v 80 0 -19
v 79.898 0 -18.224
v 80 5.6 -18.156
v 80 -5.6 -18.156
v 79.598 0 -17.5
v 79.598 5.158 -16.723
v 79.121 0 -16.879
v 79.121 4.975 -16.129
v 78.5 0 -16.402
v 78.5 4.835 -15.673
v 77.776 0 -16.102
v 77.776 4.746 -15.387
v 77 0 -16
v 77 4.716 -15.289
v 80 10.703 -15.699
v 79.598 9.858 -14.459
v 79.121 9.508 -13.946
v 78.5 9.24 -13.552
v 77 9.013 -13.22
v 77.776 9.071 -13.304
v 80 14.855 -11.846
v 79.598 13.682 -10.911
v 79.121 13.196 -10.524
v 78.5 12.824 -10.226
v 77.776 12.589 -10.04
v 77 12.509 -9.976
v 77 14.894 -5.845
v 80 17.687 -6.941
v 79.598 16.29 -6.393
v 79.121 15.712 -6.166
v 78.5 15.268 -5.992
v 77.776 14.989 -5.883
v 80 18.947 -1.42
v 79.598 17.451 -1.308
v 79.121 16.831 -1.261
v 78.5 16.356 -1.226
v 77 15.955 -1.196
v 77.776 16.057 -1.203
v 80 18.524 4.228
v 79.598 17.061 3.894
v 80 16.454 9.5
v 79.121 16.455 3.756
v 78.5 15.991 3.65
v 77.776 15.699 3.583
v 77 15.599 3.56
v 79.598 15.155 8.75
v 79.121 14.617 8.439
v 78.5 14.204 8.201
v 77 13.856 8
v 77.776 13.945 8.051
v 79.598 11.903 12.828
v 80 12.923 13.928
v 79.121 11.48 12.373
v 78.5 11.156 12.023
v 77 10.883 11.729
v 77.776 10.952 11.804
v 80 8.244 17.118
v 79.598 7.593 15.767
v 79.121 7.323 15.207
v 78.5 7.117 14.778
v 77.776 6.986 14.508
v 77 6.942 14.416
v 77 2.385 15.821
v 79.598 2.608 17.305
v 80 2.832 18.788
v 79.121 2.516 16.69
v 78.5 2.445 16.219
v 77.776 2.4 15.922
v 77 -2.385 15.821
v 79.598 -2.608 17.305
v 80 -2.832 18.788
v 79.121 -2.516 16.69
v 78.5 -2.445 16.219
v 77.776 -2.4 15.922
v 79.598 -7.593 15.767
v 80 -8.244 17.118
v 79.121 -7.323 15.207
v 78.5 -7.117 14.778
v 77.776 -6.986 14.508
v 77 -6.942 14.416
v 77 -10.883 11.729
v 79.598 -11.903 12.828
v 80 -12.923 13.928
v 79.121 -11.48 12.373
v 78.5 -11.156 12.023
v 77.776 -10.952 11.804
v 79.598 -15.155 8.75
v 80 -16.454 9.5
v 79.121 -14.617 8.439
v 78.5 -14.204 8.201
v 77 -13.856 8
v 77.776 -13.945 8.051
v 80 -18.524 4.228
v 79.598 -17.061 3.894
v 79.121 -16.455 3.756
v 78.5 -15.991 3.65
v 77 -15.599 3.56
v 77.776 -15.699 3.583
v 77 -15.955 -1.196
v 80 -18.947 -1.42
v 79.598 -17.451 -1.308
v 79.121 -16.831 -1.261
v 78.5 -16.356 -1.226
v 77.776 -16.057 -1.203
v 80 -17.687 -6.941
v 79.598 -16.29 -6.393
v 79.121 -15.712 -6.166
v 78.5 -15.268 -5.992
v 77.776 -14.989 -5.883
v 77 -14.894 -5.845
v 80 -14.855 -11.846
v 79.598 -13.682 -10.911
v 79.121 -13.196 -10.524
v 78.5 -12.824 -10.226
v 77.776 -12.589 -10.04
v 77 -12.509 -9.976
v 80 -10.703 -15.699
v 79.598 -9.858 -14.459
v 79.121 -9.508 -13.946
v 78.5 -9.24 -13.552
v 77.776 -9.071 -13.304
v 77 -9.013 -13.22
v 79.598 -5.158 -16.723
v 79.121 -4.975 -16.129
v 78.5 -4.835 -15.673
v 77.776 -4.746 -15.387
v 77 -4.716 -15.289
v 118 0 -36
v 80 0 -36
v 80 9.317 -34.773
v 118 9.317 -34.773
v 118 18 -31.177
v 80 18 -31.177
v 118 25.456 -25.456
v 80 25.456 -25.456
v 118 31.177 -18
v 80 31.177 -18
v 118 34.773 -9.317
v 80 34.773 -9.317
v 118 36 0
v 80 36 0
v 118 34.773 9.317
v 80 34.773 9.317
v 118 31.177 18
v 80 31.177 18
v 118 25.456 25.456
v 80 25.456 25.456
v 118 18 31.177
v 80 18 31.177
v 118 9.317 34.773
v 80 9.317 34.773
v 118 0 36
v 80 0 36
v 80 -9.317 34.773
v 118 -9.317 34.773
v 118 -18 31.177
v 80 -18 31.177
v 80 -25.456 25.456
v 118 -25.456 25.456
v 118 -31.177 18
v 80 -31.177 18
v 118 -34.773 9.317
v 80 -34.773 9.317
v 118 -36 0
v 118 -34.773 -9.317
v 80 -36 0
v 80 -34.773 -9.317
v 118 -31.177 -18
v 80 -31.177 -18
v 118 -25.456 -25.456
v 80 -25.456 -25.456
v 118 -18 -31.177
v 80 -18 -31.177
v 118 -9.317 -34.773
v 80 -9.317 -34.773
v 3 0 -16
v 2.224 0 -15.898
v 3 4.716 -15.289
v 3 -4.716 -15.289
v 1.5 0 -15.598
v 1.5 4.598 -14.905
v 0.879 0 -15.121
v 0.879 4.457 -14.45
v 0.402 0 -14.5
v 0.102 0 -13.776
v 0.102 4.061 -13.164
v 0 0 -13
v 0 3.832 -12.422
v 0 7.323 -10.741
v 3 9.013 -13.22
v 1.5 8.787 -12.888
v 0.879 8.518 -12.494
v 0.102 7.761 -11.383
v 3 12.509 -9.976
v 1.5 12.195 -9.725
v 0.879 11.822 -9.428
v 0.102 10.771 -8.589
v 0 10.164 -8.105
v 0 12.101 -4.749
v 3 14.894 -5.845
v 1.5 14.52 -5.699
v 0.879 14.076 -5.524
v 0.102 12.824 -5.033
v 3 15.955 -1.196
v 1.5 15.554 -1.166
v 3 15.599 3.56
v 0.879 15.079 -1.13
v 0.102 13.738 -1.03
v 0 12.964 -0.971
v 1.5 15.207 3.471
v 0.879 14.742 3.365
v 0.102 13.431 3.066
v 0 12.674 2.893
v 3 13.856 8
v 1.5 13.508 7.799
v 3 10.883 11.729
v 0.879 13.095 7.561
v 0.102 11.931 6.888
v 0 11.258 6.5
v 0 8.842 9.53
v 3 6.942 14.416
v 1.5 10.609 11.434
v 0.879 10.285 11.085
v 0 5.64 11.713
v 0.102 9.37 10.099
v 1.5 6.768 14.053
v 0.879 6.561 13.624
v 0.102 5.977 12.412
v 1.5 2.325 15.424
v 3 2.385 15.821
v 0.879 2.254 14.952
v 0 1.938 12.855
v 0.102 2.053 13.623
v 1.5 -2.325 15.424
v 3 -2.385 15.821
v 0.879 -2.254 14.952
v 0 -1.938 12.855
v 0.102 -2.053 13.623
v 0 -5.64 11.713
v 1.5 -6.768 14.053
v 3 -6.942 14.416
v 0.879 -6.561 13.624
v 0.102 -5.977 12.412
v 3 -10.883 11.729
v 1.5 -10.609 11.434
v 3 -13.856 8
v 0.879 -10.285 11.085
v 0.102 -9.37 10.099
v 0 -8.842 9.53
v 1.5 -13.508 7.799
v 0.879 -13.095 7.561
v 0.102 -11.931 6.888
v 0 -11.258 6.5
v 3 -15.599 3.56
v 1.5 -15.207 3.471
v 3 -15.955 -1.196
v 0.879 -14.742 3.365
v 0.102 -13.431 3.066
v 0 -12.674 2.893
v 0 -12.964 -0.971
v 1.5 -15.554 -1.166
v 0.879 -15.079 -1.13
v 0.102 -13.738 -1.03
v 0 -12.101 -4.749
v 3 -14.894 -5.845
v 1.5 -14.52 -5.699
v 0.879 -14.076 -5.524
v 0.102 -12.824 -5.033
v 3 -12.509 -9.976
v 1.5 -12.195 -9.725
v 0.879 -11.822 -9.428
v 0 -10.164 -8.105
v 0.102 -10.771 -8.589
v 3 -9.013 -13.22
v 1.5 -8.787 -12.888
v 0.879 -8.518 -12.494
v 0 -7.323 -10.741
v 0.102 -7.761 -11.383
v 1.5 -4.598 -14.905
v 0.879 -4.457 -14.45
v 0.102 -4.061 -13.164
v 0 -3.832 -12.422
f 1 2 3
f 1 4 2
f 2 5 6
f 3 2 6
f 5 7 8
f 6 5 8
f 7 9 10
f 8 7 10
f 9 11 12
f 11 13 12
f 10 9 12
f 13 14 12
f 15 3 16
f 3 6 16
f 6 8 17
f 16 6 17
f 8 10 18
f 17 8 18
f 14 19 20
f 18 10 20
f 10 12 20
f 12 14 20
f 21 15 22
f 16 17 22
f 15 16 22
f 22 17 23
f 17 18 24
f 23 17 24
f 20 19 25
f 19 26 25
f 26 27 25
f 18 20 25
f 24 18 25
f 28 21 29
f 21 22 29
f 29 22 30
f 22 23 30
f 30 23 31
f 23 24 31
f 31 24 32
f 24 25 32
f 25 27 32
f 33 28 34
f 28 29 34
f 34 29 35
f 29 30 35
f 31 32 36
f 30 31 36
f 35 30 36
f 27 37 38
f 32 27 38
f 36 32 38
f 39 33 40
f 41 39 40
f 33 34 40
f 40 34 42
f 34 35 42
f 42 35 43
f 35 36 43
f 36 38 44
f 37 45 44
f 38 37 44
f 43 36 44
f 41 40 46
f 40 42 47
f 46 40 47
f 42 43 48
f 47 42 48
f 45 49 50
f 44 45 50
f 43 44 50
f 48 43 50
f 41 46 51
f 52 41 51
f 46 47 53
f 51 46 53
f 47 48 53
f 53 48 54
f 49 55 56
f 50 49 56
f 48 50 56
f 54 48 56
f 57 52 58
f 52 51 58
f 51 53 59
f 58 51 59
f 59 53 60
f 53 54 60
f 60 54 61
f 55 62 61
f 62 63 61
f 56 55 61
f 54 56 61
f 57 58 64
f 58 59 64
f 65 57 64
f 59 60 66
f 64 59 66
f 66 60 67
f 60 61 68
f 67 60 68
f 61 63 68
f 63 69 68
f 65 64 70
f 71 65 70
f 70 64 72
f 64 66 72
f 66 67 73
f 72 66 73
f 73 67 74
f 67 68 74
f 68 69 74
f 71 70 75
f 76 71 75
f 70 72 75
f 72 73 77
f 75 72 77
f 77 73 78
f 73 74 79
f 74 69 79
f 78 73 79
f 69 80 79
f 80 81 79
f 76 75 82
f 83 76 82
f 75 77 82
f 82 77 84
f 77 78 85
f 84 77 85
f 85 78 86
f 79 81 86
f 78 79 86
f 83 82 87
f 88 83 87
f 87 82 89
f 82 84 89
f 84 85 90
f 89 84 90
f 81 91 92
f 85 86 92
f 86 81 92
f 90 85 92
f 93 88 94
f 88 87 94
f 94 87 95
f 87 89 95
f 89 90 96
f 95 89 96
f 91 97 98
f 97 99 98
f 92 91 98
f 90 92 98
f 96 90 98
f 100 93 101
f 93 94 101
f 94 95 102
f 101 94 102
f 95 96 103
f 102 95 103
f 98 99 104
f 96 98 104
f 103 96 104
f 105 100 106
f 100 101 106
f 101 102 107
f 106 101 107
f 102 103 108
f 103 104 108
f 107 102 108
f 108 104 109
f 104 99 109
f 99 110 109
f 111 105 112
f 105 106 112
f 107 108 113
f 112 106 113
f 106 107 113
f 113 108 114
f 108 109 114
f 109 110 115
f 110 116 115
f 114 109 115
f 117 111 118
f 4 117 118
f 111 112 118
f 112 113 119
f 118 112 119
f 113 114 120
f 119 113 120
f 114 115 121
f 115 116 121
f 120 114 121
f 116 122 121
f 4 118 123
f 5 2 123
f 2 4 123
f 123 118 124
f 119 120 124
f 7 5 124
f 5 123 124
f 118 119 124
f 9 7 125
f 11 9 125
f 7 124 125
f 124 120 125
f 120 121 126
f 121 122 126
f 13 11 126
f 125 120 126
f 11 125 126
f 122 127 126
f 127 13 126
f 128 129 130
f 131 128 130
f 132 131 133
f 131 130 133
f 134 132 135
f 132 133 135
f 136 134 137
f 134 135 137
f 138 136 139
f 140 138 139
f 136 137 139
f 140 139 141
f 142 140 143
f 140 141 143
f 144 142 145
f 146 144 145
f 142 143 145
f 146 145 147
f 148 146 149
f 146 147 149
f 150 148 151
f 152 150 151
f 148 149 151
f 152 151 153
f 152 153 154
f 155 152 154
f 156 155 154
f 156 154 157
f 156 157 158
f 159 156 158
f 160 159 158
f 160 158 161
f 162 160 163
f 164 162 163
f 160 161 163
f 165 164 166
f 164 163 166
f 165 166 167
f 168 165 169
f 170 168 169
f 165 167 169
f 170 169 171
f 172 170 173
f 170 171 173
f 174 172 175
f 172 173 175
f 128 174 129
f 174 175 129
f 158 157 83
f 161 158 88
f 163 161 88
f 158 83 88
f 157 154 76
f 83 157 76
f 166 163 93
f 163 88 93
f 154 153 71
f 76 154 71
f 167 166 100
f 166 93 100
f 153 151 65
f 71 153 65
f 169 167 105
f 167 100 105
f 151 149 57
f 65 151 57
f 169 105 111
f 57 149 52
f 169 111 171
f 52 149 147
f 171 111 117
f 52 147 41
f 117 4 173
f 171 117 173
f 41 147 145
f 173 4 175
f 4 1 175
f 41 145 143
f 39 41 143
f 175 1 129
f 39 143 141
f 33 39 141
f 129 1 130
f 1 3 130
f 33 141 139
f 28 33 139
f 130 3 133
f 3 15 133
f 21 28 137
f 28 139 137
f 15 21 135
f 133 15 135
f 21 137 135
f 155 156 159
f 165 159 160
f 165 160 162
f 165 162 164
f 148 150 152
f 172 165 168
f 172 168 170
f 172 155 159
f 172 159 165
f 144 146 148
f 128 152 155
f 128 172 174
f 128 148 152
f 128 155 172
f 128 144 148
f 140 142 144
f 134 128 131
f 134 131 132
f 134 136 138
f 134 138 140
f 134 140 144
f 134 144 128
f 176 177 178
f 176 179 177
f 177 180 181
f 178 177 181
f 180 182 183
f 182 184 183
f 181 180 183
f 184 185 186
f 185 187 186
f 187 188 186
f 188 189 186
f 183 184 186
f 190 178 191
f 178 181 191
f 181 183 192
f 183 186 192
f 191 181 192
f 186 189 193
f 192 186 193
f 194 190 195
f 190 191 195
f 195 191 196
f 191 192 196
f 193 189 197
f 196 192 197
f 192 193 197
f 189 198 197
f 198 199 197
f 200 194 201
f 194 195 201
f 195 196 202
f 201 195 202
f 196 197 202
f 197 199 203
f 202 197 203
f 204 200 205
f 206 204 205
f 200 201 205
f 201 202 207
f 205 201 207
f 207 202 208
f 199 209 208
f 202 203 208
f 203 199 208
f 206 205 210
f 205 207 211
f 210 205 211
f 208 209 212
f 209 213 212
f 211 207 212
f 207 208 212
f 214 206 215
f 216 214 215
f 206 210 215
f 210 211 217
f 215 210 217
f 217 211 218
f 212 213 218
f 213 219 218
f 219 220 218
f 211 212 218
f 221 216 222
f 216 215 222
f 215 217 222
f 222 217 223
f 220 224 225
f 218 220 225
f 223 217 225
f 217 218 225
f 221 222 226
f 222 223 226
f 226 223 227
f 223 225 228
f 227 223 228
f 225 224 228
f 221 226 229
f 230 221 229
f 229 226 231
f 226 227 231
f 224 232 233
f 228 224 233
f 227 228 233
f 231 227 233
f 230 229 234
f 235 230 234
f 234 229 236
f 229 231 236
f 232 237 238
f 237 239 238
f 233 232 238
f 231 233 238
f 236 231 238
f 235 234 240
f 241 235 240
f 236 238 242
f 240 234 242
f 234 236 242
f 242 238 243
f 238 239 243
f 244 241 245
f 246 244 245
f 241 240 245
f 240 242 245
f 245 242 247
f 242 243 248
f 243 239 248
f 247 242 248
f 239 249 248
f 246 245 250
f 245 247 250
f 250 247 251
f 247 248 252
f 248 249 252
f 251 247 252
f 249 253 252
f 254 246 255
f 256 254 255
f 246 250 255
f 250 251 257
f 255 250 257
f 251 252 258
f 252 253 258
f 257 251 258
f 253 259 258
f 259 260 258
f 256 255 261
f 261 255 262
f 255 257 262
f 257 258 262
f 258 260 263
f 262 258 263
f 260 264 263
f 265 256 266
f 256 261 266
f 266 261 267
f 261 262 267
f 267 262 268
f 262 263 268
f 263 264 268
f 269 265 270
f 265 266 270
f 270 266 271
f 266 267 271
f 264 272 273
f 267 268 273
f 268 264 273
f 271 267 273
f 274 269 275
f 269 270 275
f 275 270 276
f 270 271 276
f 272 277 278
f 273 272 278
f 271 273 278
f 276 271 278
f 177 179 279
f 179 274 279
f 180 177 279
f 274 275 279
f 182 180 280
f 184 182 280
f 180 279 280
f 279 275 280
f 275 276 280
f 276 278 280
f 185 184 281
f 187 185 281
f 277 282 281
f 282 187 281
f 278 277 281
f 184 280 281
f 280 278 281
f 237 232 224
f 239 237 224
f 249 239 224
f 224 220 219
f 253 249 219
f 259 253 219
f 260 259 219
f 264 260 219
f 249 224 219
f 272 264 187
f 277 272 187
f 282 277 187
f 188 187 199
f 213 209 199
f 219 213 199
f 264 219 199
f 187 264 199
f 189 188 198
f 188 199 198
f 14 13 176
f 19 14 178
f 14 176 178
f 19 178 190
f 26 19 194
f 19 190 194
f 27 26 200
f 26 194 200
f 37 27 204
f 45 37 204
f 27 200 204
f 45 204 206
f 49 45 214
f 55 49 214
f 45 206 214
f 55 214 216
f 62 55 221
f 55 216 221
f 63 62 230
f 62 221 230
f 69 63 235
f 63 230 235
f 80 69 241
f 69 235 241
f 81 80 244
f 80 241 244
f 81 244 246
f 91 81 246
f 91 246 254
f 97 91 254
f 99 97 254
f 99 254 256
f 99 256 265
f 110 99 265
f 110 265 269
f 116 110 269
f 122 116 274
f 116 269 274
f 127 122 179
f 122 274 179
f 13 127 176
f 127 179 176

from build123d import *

# Parameters (mm, degrees)
SKETCH3_R           = 16
BOSS_EXTRUDE1_DEPTH = 80
SKETCH4_R           = 36
BOSS_EXTRUDE2_DEPTH = 38
FILLET1_R           = 3


with BuildPart() as part:
    # Sketch3 → Boss-Extrude1 (new body)
    with BuildSketch(Plane(origin=(0, 0, 0), x_dir=(0, 0, -1), z_dir=(1, 0, 0))):
        Circle(SKETCH3_R)
    extrude(amount=BOSS_EXTRUDE1_DEPTH)

    # Sketch4 → Boss-Extrude2 (add)
    with BuildSketch(Plane(origin=(80, 0, 0), x_dir=(0, 0, -1), z_dir=(1, 0, 0))):
        Circle(SKETCH4_R)
    extrude(amount=BOSS_EXTRUDE2_DEPTH)

    # Fillet1
    fillet1_edges = [part.edges().sort_by_distance(p)[0] for p in [
        (0, 0, 16),
        (80, 0, 16),
    ]]
    fillet(fillet1_edges, radius=FILLET1_R)


solid = part.part
